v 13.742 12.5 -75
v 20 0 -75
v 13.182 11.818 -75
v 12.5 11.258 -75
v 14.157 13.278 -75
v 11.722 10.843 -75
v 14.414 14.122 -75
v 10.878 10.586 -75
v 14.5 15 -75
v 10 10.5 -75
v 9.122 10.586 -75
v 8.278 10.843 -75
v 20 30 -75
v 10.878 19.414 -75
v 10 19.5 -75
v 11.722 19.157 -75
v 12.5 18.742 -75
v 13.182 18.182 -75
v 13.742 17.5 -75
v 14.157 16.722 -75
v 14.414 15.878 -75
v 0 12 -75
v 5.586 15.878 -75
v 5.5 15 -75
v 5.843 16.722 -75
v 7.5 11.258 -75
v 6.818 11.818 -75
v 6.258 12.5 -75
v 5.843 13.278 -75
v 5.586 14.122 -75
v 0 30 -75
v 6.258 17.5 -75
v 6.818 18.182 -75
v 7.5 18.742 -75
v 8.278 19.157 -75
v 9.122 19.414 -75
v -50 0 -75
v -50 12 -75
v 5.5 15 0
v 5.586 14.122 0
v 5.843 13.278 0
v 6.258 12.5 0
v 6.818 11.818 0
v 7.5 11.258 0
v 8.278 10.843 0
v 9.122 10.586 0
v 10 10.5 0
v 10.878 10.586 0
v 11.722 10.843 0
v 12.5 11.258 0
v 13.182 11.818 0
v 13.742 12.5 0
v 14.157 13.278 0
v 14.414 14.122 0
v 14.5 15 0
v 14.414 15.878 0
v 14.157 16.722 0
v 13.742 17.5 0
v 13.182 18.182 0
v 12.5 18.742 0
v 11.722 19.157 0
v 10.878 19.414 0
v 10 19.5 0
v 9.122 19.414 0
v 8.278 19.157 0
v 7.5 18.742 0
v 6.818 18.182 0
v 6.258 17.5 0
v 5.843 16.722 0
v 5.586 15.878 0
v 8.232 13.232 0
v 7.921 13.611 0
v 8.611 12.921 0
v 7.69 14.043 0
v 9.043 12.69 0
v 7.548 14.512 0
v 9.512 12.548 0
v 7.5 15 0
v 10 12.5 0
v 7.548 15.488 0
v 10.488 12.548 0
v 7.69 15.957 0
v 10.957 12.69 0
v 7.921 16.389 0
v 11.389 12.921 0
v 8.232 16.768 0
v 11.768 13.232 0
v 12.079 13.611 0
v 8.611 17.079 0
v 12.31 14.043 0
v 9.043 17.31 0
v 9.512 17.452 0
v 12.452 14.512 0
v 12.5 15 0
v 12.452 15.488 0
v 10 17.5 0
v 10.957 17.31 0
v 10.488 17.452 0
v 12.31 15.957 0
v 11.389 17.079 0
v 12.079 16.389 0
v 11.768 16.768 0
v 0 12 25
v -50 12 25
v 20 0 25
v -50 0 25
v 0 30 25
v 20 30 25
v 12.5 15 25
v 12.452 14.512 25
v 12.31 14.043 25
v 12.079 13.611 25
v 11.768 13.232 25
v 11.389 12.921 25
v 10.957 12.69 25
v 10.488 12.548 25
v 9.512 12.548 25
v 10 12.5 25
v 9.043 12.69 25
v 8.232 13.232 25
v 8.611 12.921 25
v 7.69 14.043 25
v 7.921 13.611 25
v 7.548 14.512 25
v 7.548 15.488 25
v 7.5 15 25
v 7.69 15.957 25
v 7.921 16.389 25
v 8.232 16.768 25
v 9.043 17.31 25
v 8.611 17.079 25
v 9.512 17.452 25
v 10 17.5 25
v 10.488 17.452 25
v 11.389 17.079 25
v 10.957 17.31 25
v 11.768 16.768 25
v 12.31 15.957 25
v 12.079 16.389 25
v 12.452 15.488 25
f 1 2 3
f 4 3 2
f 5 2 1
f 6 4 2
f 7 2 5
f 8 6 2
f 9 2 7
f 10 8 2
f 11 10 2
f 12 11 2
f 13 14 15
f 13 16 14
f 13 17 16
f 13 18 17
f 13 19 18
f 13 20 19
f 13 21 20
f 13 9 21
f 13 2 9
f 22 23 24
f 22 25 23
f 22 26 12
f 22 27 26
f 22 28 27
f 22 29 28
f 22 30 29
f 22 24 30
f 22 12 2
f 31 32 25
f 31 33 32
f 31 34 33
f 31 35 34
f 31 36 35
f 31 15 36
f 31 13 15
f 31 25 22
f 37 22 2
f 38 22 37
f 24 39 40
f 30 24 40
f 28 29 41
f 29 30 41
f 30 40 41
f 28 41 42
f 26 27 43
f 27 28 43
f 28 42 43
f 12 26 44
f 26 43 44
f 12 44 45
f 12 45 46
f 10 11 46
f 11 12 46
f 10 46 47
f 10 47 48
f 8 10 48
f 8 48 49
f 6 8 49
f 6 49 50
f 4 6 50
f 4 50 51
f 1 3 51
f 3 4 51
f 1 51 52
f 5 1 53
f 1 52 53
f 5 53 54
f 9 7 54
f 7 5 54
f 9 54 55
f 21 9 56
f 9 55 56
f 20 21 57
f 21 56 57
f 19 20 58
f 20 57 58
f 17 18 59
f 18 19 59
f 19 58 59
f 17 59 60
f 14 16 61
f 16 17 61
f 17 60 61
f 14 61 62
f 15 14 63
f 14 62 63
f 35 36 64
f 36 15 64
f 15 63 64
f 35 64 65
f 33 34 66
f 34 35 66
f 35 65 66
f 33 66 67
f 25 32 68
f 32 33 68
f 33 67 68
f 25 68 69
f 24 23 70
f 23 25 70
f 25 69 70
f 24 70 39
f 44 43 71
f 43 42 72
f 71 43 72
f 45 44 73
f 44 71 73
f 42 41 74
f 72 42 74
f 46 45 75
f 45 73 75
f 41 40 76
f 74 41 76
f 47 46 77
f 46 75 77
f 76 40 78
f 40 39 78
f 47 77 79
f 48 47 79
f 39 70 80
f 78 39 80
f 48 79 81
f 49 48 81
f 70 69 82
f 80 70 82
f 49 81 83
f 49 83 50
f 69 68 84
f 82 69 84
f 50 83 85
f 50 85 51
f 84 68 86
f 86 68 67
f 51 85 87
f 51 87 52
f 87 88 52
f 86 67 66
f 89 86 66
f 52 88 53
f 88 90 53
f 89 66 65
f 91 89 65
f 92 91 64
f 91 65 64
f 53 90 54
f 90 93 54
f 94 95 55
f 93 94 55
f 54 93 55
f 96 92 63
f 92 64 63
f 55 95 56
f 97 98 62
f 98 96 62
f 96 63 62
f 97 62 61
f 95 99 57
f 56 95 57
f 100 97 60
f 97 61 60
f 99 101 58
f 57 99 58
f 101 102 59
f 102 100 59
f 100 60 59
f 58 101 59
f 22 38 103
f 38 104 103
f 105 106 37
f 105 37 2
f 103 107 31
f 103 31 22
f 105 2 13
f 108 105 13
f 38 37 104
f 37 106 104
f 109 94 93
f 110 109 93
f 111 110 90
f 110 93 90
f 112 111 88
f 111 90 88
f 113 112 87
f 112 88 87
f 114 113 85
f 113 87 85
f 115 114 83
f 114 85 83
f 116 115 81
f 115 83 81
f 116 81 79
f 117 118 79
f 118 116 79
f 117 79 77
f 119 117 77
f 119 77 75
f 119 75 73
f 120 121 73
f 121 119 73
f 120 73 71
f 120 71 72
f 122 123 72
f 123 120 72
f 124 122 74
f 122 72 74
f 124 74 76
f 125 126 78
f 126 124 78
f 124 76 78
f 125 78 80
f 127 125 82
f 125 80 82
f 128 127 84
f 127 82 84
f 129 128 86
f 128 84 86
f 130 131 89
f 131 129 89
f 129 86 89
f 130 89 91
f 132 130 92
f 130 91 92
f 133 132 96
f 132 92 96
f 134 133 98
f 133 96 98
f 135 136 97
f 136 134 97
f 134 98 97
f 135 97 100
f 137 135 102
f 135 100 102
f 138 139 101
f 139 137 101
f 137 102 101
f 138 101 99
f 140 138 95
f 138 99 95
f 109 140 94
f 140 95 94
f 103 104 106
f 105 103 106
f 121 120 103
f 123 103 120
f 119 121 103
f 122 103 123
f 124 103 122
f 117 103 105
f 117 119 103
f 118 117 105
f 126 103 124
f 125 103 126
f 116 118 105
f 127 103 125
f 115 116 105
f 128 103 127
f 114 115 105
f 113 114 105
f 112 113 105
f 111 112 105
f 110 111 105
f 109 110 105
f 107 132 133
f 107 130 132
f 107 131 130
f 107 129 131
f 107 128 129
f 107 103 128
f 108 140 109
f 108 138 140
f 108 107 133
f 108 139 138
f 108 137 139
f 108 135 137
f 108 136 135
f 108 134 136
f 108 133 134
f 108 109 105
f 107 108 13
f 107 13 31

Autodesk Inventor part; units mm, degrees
ref_plane "YZ Plane" through (0, 0, 0) normal (1, 0, 0) x (0, 1, 0)
ref_plane "XZ Plane" through (0, 0, 0) normal (0, 1, 0) x (-1, 0, 0)
ref_plane "XY Plane" through (0, 0, 0) normal (0, 0, 1) x (1, 0, 0)
sketch "Sketch1" plane through (0, 0, 0) normal (0, 0, 1) x (1, 0, 0)
  line L0 (0, 30) -> (20, 30)
  line L1 (20, 30) -> (20, 0)
  line L2 (20, 0) -> (0, 0)
  line L3 (0, 0) -> (0, 30)
  circle A0 centre (10, 15) radius 2.5
  dimension "d0" = 30
  dimension "d1" = 20
  dimension "d5" = 10
  dimension "d6" = 15
  dimension "d7" = 5
extrude "Extrusion2" add sketch "Sketch1" along normal blind 25
sketch "Sketch4" plane through (0, 0, 25) normal (0, 0, 1) x (1, 0, 0)
  line L0 (0, 0) -> (20, 0) projected
  line L1 (0, 0) -> (-50, 0)
  line L2 (-50, 0) -> (-50, 12)
  line L3 (-50, 12) -> (0, 12)
  line L4 (0, 12) -> (0, 0)
  point P0 (0, 6)
  dimension "d13" = 12
  dimension "d14" = 50
extrude "Extrusion4" add sketch "Sketch4" against normal blind 100
sketch "Sketch5" plane through (0, 0, 0) normal (0, 0, -1) x (-1, 0, 0)
  line L0 (0, 0) -> (-20, 0) projected
  line L1 (-20, 0) -> (-20, 30) projected
  line L2 (0, 0) -> (-20, 0)
  line L3 (-20, 0) -> (-20, 30)
  line L4 (-20, 30) -> (0, 30)
  line L5 (0, 30) -> (0, 0)
  circle A0 centre (-10, 15) radius 2.5 projected
  circle A1 centre (-10, 15) radius 4.5
  dimension "d17" = 9
extrude "Extrusion5" add sketch "Sketch5" along normal blind 75 contours L0 L1 L4 L5
equation "\"d5\" = 0.5 * d1"
equation "\"d6\" = 0.5 * d0"
properties part number "Touchscreen mount R v05"
